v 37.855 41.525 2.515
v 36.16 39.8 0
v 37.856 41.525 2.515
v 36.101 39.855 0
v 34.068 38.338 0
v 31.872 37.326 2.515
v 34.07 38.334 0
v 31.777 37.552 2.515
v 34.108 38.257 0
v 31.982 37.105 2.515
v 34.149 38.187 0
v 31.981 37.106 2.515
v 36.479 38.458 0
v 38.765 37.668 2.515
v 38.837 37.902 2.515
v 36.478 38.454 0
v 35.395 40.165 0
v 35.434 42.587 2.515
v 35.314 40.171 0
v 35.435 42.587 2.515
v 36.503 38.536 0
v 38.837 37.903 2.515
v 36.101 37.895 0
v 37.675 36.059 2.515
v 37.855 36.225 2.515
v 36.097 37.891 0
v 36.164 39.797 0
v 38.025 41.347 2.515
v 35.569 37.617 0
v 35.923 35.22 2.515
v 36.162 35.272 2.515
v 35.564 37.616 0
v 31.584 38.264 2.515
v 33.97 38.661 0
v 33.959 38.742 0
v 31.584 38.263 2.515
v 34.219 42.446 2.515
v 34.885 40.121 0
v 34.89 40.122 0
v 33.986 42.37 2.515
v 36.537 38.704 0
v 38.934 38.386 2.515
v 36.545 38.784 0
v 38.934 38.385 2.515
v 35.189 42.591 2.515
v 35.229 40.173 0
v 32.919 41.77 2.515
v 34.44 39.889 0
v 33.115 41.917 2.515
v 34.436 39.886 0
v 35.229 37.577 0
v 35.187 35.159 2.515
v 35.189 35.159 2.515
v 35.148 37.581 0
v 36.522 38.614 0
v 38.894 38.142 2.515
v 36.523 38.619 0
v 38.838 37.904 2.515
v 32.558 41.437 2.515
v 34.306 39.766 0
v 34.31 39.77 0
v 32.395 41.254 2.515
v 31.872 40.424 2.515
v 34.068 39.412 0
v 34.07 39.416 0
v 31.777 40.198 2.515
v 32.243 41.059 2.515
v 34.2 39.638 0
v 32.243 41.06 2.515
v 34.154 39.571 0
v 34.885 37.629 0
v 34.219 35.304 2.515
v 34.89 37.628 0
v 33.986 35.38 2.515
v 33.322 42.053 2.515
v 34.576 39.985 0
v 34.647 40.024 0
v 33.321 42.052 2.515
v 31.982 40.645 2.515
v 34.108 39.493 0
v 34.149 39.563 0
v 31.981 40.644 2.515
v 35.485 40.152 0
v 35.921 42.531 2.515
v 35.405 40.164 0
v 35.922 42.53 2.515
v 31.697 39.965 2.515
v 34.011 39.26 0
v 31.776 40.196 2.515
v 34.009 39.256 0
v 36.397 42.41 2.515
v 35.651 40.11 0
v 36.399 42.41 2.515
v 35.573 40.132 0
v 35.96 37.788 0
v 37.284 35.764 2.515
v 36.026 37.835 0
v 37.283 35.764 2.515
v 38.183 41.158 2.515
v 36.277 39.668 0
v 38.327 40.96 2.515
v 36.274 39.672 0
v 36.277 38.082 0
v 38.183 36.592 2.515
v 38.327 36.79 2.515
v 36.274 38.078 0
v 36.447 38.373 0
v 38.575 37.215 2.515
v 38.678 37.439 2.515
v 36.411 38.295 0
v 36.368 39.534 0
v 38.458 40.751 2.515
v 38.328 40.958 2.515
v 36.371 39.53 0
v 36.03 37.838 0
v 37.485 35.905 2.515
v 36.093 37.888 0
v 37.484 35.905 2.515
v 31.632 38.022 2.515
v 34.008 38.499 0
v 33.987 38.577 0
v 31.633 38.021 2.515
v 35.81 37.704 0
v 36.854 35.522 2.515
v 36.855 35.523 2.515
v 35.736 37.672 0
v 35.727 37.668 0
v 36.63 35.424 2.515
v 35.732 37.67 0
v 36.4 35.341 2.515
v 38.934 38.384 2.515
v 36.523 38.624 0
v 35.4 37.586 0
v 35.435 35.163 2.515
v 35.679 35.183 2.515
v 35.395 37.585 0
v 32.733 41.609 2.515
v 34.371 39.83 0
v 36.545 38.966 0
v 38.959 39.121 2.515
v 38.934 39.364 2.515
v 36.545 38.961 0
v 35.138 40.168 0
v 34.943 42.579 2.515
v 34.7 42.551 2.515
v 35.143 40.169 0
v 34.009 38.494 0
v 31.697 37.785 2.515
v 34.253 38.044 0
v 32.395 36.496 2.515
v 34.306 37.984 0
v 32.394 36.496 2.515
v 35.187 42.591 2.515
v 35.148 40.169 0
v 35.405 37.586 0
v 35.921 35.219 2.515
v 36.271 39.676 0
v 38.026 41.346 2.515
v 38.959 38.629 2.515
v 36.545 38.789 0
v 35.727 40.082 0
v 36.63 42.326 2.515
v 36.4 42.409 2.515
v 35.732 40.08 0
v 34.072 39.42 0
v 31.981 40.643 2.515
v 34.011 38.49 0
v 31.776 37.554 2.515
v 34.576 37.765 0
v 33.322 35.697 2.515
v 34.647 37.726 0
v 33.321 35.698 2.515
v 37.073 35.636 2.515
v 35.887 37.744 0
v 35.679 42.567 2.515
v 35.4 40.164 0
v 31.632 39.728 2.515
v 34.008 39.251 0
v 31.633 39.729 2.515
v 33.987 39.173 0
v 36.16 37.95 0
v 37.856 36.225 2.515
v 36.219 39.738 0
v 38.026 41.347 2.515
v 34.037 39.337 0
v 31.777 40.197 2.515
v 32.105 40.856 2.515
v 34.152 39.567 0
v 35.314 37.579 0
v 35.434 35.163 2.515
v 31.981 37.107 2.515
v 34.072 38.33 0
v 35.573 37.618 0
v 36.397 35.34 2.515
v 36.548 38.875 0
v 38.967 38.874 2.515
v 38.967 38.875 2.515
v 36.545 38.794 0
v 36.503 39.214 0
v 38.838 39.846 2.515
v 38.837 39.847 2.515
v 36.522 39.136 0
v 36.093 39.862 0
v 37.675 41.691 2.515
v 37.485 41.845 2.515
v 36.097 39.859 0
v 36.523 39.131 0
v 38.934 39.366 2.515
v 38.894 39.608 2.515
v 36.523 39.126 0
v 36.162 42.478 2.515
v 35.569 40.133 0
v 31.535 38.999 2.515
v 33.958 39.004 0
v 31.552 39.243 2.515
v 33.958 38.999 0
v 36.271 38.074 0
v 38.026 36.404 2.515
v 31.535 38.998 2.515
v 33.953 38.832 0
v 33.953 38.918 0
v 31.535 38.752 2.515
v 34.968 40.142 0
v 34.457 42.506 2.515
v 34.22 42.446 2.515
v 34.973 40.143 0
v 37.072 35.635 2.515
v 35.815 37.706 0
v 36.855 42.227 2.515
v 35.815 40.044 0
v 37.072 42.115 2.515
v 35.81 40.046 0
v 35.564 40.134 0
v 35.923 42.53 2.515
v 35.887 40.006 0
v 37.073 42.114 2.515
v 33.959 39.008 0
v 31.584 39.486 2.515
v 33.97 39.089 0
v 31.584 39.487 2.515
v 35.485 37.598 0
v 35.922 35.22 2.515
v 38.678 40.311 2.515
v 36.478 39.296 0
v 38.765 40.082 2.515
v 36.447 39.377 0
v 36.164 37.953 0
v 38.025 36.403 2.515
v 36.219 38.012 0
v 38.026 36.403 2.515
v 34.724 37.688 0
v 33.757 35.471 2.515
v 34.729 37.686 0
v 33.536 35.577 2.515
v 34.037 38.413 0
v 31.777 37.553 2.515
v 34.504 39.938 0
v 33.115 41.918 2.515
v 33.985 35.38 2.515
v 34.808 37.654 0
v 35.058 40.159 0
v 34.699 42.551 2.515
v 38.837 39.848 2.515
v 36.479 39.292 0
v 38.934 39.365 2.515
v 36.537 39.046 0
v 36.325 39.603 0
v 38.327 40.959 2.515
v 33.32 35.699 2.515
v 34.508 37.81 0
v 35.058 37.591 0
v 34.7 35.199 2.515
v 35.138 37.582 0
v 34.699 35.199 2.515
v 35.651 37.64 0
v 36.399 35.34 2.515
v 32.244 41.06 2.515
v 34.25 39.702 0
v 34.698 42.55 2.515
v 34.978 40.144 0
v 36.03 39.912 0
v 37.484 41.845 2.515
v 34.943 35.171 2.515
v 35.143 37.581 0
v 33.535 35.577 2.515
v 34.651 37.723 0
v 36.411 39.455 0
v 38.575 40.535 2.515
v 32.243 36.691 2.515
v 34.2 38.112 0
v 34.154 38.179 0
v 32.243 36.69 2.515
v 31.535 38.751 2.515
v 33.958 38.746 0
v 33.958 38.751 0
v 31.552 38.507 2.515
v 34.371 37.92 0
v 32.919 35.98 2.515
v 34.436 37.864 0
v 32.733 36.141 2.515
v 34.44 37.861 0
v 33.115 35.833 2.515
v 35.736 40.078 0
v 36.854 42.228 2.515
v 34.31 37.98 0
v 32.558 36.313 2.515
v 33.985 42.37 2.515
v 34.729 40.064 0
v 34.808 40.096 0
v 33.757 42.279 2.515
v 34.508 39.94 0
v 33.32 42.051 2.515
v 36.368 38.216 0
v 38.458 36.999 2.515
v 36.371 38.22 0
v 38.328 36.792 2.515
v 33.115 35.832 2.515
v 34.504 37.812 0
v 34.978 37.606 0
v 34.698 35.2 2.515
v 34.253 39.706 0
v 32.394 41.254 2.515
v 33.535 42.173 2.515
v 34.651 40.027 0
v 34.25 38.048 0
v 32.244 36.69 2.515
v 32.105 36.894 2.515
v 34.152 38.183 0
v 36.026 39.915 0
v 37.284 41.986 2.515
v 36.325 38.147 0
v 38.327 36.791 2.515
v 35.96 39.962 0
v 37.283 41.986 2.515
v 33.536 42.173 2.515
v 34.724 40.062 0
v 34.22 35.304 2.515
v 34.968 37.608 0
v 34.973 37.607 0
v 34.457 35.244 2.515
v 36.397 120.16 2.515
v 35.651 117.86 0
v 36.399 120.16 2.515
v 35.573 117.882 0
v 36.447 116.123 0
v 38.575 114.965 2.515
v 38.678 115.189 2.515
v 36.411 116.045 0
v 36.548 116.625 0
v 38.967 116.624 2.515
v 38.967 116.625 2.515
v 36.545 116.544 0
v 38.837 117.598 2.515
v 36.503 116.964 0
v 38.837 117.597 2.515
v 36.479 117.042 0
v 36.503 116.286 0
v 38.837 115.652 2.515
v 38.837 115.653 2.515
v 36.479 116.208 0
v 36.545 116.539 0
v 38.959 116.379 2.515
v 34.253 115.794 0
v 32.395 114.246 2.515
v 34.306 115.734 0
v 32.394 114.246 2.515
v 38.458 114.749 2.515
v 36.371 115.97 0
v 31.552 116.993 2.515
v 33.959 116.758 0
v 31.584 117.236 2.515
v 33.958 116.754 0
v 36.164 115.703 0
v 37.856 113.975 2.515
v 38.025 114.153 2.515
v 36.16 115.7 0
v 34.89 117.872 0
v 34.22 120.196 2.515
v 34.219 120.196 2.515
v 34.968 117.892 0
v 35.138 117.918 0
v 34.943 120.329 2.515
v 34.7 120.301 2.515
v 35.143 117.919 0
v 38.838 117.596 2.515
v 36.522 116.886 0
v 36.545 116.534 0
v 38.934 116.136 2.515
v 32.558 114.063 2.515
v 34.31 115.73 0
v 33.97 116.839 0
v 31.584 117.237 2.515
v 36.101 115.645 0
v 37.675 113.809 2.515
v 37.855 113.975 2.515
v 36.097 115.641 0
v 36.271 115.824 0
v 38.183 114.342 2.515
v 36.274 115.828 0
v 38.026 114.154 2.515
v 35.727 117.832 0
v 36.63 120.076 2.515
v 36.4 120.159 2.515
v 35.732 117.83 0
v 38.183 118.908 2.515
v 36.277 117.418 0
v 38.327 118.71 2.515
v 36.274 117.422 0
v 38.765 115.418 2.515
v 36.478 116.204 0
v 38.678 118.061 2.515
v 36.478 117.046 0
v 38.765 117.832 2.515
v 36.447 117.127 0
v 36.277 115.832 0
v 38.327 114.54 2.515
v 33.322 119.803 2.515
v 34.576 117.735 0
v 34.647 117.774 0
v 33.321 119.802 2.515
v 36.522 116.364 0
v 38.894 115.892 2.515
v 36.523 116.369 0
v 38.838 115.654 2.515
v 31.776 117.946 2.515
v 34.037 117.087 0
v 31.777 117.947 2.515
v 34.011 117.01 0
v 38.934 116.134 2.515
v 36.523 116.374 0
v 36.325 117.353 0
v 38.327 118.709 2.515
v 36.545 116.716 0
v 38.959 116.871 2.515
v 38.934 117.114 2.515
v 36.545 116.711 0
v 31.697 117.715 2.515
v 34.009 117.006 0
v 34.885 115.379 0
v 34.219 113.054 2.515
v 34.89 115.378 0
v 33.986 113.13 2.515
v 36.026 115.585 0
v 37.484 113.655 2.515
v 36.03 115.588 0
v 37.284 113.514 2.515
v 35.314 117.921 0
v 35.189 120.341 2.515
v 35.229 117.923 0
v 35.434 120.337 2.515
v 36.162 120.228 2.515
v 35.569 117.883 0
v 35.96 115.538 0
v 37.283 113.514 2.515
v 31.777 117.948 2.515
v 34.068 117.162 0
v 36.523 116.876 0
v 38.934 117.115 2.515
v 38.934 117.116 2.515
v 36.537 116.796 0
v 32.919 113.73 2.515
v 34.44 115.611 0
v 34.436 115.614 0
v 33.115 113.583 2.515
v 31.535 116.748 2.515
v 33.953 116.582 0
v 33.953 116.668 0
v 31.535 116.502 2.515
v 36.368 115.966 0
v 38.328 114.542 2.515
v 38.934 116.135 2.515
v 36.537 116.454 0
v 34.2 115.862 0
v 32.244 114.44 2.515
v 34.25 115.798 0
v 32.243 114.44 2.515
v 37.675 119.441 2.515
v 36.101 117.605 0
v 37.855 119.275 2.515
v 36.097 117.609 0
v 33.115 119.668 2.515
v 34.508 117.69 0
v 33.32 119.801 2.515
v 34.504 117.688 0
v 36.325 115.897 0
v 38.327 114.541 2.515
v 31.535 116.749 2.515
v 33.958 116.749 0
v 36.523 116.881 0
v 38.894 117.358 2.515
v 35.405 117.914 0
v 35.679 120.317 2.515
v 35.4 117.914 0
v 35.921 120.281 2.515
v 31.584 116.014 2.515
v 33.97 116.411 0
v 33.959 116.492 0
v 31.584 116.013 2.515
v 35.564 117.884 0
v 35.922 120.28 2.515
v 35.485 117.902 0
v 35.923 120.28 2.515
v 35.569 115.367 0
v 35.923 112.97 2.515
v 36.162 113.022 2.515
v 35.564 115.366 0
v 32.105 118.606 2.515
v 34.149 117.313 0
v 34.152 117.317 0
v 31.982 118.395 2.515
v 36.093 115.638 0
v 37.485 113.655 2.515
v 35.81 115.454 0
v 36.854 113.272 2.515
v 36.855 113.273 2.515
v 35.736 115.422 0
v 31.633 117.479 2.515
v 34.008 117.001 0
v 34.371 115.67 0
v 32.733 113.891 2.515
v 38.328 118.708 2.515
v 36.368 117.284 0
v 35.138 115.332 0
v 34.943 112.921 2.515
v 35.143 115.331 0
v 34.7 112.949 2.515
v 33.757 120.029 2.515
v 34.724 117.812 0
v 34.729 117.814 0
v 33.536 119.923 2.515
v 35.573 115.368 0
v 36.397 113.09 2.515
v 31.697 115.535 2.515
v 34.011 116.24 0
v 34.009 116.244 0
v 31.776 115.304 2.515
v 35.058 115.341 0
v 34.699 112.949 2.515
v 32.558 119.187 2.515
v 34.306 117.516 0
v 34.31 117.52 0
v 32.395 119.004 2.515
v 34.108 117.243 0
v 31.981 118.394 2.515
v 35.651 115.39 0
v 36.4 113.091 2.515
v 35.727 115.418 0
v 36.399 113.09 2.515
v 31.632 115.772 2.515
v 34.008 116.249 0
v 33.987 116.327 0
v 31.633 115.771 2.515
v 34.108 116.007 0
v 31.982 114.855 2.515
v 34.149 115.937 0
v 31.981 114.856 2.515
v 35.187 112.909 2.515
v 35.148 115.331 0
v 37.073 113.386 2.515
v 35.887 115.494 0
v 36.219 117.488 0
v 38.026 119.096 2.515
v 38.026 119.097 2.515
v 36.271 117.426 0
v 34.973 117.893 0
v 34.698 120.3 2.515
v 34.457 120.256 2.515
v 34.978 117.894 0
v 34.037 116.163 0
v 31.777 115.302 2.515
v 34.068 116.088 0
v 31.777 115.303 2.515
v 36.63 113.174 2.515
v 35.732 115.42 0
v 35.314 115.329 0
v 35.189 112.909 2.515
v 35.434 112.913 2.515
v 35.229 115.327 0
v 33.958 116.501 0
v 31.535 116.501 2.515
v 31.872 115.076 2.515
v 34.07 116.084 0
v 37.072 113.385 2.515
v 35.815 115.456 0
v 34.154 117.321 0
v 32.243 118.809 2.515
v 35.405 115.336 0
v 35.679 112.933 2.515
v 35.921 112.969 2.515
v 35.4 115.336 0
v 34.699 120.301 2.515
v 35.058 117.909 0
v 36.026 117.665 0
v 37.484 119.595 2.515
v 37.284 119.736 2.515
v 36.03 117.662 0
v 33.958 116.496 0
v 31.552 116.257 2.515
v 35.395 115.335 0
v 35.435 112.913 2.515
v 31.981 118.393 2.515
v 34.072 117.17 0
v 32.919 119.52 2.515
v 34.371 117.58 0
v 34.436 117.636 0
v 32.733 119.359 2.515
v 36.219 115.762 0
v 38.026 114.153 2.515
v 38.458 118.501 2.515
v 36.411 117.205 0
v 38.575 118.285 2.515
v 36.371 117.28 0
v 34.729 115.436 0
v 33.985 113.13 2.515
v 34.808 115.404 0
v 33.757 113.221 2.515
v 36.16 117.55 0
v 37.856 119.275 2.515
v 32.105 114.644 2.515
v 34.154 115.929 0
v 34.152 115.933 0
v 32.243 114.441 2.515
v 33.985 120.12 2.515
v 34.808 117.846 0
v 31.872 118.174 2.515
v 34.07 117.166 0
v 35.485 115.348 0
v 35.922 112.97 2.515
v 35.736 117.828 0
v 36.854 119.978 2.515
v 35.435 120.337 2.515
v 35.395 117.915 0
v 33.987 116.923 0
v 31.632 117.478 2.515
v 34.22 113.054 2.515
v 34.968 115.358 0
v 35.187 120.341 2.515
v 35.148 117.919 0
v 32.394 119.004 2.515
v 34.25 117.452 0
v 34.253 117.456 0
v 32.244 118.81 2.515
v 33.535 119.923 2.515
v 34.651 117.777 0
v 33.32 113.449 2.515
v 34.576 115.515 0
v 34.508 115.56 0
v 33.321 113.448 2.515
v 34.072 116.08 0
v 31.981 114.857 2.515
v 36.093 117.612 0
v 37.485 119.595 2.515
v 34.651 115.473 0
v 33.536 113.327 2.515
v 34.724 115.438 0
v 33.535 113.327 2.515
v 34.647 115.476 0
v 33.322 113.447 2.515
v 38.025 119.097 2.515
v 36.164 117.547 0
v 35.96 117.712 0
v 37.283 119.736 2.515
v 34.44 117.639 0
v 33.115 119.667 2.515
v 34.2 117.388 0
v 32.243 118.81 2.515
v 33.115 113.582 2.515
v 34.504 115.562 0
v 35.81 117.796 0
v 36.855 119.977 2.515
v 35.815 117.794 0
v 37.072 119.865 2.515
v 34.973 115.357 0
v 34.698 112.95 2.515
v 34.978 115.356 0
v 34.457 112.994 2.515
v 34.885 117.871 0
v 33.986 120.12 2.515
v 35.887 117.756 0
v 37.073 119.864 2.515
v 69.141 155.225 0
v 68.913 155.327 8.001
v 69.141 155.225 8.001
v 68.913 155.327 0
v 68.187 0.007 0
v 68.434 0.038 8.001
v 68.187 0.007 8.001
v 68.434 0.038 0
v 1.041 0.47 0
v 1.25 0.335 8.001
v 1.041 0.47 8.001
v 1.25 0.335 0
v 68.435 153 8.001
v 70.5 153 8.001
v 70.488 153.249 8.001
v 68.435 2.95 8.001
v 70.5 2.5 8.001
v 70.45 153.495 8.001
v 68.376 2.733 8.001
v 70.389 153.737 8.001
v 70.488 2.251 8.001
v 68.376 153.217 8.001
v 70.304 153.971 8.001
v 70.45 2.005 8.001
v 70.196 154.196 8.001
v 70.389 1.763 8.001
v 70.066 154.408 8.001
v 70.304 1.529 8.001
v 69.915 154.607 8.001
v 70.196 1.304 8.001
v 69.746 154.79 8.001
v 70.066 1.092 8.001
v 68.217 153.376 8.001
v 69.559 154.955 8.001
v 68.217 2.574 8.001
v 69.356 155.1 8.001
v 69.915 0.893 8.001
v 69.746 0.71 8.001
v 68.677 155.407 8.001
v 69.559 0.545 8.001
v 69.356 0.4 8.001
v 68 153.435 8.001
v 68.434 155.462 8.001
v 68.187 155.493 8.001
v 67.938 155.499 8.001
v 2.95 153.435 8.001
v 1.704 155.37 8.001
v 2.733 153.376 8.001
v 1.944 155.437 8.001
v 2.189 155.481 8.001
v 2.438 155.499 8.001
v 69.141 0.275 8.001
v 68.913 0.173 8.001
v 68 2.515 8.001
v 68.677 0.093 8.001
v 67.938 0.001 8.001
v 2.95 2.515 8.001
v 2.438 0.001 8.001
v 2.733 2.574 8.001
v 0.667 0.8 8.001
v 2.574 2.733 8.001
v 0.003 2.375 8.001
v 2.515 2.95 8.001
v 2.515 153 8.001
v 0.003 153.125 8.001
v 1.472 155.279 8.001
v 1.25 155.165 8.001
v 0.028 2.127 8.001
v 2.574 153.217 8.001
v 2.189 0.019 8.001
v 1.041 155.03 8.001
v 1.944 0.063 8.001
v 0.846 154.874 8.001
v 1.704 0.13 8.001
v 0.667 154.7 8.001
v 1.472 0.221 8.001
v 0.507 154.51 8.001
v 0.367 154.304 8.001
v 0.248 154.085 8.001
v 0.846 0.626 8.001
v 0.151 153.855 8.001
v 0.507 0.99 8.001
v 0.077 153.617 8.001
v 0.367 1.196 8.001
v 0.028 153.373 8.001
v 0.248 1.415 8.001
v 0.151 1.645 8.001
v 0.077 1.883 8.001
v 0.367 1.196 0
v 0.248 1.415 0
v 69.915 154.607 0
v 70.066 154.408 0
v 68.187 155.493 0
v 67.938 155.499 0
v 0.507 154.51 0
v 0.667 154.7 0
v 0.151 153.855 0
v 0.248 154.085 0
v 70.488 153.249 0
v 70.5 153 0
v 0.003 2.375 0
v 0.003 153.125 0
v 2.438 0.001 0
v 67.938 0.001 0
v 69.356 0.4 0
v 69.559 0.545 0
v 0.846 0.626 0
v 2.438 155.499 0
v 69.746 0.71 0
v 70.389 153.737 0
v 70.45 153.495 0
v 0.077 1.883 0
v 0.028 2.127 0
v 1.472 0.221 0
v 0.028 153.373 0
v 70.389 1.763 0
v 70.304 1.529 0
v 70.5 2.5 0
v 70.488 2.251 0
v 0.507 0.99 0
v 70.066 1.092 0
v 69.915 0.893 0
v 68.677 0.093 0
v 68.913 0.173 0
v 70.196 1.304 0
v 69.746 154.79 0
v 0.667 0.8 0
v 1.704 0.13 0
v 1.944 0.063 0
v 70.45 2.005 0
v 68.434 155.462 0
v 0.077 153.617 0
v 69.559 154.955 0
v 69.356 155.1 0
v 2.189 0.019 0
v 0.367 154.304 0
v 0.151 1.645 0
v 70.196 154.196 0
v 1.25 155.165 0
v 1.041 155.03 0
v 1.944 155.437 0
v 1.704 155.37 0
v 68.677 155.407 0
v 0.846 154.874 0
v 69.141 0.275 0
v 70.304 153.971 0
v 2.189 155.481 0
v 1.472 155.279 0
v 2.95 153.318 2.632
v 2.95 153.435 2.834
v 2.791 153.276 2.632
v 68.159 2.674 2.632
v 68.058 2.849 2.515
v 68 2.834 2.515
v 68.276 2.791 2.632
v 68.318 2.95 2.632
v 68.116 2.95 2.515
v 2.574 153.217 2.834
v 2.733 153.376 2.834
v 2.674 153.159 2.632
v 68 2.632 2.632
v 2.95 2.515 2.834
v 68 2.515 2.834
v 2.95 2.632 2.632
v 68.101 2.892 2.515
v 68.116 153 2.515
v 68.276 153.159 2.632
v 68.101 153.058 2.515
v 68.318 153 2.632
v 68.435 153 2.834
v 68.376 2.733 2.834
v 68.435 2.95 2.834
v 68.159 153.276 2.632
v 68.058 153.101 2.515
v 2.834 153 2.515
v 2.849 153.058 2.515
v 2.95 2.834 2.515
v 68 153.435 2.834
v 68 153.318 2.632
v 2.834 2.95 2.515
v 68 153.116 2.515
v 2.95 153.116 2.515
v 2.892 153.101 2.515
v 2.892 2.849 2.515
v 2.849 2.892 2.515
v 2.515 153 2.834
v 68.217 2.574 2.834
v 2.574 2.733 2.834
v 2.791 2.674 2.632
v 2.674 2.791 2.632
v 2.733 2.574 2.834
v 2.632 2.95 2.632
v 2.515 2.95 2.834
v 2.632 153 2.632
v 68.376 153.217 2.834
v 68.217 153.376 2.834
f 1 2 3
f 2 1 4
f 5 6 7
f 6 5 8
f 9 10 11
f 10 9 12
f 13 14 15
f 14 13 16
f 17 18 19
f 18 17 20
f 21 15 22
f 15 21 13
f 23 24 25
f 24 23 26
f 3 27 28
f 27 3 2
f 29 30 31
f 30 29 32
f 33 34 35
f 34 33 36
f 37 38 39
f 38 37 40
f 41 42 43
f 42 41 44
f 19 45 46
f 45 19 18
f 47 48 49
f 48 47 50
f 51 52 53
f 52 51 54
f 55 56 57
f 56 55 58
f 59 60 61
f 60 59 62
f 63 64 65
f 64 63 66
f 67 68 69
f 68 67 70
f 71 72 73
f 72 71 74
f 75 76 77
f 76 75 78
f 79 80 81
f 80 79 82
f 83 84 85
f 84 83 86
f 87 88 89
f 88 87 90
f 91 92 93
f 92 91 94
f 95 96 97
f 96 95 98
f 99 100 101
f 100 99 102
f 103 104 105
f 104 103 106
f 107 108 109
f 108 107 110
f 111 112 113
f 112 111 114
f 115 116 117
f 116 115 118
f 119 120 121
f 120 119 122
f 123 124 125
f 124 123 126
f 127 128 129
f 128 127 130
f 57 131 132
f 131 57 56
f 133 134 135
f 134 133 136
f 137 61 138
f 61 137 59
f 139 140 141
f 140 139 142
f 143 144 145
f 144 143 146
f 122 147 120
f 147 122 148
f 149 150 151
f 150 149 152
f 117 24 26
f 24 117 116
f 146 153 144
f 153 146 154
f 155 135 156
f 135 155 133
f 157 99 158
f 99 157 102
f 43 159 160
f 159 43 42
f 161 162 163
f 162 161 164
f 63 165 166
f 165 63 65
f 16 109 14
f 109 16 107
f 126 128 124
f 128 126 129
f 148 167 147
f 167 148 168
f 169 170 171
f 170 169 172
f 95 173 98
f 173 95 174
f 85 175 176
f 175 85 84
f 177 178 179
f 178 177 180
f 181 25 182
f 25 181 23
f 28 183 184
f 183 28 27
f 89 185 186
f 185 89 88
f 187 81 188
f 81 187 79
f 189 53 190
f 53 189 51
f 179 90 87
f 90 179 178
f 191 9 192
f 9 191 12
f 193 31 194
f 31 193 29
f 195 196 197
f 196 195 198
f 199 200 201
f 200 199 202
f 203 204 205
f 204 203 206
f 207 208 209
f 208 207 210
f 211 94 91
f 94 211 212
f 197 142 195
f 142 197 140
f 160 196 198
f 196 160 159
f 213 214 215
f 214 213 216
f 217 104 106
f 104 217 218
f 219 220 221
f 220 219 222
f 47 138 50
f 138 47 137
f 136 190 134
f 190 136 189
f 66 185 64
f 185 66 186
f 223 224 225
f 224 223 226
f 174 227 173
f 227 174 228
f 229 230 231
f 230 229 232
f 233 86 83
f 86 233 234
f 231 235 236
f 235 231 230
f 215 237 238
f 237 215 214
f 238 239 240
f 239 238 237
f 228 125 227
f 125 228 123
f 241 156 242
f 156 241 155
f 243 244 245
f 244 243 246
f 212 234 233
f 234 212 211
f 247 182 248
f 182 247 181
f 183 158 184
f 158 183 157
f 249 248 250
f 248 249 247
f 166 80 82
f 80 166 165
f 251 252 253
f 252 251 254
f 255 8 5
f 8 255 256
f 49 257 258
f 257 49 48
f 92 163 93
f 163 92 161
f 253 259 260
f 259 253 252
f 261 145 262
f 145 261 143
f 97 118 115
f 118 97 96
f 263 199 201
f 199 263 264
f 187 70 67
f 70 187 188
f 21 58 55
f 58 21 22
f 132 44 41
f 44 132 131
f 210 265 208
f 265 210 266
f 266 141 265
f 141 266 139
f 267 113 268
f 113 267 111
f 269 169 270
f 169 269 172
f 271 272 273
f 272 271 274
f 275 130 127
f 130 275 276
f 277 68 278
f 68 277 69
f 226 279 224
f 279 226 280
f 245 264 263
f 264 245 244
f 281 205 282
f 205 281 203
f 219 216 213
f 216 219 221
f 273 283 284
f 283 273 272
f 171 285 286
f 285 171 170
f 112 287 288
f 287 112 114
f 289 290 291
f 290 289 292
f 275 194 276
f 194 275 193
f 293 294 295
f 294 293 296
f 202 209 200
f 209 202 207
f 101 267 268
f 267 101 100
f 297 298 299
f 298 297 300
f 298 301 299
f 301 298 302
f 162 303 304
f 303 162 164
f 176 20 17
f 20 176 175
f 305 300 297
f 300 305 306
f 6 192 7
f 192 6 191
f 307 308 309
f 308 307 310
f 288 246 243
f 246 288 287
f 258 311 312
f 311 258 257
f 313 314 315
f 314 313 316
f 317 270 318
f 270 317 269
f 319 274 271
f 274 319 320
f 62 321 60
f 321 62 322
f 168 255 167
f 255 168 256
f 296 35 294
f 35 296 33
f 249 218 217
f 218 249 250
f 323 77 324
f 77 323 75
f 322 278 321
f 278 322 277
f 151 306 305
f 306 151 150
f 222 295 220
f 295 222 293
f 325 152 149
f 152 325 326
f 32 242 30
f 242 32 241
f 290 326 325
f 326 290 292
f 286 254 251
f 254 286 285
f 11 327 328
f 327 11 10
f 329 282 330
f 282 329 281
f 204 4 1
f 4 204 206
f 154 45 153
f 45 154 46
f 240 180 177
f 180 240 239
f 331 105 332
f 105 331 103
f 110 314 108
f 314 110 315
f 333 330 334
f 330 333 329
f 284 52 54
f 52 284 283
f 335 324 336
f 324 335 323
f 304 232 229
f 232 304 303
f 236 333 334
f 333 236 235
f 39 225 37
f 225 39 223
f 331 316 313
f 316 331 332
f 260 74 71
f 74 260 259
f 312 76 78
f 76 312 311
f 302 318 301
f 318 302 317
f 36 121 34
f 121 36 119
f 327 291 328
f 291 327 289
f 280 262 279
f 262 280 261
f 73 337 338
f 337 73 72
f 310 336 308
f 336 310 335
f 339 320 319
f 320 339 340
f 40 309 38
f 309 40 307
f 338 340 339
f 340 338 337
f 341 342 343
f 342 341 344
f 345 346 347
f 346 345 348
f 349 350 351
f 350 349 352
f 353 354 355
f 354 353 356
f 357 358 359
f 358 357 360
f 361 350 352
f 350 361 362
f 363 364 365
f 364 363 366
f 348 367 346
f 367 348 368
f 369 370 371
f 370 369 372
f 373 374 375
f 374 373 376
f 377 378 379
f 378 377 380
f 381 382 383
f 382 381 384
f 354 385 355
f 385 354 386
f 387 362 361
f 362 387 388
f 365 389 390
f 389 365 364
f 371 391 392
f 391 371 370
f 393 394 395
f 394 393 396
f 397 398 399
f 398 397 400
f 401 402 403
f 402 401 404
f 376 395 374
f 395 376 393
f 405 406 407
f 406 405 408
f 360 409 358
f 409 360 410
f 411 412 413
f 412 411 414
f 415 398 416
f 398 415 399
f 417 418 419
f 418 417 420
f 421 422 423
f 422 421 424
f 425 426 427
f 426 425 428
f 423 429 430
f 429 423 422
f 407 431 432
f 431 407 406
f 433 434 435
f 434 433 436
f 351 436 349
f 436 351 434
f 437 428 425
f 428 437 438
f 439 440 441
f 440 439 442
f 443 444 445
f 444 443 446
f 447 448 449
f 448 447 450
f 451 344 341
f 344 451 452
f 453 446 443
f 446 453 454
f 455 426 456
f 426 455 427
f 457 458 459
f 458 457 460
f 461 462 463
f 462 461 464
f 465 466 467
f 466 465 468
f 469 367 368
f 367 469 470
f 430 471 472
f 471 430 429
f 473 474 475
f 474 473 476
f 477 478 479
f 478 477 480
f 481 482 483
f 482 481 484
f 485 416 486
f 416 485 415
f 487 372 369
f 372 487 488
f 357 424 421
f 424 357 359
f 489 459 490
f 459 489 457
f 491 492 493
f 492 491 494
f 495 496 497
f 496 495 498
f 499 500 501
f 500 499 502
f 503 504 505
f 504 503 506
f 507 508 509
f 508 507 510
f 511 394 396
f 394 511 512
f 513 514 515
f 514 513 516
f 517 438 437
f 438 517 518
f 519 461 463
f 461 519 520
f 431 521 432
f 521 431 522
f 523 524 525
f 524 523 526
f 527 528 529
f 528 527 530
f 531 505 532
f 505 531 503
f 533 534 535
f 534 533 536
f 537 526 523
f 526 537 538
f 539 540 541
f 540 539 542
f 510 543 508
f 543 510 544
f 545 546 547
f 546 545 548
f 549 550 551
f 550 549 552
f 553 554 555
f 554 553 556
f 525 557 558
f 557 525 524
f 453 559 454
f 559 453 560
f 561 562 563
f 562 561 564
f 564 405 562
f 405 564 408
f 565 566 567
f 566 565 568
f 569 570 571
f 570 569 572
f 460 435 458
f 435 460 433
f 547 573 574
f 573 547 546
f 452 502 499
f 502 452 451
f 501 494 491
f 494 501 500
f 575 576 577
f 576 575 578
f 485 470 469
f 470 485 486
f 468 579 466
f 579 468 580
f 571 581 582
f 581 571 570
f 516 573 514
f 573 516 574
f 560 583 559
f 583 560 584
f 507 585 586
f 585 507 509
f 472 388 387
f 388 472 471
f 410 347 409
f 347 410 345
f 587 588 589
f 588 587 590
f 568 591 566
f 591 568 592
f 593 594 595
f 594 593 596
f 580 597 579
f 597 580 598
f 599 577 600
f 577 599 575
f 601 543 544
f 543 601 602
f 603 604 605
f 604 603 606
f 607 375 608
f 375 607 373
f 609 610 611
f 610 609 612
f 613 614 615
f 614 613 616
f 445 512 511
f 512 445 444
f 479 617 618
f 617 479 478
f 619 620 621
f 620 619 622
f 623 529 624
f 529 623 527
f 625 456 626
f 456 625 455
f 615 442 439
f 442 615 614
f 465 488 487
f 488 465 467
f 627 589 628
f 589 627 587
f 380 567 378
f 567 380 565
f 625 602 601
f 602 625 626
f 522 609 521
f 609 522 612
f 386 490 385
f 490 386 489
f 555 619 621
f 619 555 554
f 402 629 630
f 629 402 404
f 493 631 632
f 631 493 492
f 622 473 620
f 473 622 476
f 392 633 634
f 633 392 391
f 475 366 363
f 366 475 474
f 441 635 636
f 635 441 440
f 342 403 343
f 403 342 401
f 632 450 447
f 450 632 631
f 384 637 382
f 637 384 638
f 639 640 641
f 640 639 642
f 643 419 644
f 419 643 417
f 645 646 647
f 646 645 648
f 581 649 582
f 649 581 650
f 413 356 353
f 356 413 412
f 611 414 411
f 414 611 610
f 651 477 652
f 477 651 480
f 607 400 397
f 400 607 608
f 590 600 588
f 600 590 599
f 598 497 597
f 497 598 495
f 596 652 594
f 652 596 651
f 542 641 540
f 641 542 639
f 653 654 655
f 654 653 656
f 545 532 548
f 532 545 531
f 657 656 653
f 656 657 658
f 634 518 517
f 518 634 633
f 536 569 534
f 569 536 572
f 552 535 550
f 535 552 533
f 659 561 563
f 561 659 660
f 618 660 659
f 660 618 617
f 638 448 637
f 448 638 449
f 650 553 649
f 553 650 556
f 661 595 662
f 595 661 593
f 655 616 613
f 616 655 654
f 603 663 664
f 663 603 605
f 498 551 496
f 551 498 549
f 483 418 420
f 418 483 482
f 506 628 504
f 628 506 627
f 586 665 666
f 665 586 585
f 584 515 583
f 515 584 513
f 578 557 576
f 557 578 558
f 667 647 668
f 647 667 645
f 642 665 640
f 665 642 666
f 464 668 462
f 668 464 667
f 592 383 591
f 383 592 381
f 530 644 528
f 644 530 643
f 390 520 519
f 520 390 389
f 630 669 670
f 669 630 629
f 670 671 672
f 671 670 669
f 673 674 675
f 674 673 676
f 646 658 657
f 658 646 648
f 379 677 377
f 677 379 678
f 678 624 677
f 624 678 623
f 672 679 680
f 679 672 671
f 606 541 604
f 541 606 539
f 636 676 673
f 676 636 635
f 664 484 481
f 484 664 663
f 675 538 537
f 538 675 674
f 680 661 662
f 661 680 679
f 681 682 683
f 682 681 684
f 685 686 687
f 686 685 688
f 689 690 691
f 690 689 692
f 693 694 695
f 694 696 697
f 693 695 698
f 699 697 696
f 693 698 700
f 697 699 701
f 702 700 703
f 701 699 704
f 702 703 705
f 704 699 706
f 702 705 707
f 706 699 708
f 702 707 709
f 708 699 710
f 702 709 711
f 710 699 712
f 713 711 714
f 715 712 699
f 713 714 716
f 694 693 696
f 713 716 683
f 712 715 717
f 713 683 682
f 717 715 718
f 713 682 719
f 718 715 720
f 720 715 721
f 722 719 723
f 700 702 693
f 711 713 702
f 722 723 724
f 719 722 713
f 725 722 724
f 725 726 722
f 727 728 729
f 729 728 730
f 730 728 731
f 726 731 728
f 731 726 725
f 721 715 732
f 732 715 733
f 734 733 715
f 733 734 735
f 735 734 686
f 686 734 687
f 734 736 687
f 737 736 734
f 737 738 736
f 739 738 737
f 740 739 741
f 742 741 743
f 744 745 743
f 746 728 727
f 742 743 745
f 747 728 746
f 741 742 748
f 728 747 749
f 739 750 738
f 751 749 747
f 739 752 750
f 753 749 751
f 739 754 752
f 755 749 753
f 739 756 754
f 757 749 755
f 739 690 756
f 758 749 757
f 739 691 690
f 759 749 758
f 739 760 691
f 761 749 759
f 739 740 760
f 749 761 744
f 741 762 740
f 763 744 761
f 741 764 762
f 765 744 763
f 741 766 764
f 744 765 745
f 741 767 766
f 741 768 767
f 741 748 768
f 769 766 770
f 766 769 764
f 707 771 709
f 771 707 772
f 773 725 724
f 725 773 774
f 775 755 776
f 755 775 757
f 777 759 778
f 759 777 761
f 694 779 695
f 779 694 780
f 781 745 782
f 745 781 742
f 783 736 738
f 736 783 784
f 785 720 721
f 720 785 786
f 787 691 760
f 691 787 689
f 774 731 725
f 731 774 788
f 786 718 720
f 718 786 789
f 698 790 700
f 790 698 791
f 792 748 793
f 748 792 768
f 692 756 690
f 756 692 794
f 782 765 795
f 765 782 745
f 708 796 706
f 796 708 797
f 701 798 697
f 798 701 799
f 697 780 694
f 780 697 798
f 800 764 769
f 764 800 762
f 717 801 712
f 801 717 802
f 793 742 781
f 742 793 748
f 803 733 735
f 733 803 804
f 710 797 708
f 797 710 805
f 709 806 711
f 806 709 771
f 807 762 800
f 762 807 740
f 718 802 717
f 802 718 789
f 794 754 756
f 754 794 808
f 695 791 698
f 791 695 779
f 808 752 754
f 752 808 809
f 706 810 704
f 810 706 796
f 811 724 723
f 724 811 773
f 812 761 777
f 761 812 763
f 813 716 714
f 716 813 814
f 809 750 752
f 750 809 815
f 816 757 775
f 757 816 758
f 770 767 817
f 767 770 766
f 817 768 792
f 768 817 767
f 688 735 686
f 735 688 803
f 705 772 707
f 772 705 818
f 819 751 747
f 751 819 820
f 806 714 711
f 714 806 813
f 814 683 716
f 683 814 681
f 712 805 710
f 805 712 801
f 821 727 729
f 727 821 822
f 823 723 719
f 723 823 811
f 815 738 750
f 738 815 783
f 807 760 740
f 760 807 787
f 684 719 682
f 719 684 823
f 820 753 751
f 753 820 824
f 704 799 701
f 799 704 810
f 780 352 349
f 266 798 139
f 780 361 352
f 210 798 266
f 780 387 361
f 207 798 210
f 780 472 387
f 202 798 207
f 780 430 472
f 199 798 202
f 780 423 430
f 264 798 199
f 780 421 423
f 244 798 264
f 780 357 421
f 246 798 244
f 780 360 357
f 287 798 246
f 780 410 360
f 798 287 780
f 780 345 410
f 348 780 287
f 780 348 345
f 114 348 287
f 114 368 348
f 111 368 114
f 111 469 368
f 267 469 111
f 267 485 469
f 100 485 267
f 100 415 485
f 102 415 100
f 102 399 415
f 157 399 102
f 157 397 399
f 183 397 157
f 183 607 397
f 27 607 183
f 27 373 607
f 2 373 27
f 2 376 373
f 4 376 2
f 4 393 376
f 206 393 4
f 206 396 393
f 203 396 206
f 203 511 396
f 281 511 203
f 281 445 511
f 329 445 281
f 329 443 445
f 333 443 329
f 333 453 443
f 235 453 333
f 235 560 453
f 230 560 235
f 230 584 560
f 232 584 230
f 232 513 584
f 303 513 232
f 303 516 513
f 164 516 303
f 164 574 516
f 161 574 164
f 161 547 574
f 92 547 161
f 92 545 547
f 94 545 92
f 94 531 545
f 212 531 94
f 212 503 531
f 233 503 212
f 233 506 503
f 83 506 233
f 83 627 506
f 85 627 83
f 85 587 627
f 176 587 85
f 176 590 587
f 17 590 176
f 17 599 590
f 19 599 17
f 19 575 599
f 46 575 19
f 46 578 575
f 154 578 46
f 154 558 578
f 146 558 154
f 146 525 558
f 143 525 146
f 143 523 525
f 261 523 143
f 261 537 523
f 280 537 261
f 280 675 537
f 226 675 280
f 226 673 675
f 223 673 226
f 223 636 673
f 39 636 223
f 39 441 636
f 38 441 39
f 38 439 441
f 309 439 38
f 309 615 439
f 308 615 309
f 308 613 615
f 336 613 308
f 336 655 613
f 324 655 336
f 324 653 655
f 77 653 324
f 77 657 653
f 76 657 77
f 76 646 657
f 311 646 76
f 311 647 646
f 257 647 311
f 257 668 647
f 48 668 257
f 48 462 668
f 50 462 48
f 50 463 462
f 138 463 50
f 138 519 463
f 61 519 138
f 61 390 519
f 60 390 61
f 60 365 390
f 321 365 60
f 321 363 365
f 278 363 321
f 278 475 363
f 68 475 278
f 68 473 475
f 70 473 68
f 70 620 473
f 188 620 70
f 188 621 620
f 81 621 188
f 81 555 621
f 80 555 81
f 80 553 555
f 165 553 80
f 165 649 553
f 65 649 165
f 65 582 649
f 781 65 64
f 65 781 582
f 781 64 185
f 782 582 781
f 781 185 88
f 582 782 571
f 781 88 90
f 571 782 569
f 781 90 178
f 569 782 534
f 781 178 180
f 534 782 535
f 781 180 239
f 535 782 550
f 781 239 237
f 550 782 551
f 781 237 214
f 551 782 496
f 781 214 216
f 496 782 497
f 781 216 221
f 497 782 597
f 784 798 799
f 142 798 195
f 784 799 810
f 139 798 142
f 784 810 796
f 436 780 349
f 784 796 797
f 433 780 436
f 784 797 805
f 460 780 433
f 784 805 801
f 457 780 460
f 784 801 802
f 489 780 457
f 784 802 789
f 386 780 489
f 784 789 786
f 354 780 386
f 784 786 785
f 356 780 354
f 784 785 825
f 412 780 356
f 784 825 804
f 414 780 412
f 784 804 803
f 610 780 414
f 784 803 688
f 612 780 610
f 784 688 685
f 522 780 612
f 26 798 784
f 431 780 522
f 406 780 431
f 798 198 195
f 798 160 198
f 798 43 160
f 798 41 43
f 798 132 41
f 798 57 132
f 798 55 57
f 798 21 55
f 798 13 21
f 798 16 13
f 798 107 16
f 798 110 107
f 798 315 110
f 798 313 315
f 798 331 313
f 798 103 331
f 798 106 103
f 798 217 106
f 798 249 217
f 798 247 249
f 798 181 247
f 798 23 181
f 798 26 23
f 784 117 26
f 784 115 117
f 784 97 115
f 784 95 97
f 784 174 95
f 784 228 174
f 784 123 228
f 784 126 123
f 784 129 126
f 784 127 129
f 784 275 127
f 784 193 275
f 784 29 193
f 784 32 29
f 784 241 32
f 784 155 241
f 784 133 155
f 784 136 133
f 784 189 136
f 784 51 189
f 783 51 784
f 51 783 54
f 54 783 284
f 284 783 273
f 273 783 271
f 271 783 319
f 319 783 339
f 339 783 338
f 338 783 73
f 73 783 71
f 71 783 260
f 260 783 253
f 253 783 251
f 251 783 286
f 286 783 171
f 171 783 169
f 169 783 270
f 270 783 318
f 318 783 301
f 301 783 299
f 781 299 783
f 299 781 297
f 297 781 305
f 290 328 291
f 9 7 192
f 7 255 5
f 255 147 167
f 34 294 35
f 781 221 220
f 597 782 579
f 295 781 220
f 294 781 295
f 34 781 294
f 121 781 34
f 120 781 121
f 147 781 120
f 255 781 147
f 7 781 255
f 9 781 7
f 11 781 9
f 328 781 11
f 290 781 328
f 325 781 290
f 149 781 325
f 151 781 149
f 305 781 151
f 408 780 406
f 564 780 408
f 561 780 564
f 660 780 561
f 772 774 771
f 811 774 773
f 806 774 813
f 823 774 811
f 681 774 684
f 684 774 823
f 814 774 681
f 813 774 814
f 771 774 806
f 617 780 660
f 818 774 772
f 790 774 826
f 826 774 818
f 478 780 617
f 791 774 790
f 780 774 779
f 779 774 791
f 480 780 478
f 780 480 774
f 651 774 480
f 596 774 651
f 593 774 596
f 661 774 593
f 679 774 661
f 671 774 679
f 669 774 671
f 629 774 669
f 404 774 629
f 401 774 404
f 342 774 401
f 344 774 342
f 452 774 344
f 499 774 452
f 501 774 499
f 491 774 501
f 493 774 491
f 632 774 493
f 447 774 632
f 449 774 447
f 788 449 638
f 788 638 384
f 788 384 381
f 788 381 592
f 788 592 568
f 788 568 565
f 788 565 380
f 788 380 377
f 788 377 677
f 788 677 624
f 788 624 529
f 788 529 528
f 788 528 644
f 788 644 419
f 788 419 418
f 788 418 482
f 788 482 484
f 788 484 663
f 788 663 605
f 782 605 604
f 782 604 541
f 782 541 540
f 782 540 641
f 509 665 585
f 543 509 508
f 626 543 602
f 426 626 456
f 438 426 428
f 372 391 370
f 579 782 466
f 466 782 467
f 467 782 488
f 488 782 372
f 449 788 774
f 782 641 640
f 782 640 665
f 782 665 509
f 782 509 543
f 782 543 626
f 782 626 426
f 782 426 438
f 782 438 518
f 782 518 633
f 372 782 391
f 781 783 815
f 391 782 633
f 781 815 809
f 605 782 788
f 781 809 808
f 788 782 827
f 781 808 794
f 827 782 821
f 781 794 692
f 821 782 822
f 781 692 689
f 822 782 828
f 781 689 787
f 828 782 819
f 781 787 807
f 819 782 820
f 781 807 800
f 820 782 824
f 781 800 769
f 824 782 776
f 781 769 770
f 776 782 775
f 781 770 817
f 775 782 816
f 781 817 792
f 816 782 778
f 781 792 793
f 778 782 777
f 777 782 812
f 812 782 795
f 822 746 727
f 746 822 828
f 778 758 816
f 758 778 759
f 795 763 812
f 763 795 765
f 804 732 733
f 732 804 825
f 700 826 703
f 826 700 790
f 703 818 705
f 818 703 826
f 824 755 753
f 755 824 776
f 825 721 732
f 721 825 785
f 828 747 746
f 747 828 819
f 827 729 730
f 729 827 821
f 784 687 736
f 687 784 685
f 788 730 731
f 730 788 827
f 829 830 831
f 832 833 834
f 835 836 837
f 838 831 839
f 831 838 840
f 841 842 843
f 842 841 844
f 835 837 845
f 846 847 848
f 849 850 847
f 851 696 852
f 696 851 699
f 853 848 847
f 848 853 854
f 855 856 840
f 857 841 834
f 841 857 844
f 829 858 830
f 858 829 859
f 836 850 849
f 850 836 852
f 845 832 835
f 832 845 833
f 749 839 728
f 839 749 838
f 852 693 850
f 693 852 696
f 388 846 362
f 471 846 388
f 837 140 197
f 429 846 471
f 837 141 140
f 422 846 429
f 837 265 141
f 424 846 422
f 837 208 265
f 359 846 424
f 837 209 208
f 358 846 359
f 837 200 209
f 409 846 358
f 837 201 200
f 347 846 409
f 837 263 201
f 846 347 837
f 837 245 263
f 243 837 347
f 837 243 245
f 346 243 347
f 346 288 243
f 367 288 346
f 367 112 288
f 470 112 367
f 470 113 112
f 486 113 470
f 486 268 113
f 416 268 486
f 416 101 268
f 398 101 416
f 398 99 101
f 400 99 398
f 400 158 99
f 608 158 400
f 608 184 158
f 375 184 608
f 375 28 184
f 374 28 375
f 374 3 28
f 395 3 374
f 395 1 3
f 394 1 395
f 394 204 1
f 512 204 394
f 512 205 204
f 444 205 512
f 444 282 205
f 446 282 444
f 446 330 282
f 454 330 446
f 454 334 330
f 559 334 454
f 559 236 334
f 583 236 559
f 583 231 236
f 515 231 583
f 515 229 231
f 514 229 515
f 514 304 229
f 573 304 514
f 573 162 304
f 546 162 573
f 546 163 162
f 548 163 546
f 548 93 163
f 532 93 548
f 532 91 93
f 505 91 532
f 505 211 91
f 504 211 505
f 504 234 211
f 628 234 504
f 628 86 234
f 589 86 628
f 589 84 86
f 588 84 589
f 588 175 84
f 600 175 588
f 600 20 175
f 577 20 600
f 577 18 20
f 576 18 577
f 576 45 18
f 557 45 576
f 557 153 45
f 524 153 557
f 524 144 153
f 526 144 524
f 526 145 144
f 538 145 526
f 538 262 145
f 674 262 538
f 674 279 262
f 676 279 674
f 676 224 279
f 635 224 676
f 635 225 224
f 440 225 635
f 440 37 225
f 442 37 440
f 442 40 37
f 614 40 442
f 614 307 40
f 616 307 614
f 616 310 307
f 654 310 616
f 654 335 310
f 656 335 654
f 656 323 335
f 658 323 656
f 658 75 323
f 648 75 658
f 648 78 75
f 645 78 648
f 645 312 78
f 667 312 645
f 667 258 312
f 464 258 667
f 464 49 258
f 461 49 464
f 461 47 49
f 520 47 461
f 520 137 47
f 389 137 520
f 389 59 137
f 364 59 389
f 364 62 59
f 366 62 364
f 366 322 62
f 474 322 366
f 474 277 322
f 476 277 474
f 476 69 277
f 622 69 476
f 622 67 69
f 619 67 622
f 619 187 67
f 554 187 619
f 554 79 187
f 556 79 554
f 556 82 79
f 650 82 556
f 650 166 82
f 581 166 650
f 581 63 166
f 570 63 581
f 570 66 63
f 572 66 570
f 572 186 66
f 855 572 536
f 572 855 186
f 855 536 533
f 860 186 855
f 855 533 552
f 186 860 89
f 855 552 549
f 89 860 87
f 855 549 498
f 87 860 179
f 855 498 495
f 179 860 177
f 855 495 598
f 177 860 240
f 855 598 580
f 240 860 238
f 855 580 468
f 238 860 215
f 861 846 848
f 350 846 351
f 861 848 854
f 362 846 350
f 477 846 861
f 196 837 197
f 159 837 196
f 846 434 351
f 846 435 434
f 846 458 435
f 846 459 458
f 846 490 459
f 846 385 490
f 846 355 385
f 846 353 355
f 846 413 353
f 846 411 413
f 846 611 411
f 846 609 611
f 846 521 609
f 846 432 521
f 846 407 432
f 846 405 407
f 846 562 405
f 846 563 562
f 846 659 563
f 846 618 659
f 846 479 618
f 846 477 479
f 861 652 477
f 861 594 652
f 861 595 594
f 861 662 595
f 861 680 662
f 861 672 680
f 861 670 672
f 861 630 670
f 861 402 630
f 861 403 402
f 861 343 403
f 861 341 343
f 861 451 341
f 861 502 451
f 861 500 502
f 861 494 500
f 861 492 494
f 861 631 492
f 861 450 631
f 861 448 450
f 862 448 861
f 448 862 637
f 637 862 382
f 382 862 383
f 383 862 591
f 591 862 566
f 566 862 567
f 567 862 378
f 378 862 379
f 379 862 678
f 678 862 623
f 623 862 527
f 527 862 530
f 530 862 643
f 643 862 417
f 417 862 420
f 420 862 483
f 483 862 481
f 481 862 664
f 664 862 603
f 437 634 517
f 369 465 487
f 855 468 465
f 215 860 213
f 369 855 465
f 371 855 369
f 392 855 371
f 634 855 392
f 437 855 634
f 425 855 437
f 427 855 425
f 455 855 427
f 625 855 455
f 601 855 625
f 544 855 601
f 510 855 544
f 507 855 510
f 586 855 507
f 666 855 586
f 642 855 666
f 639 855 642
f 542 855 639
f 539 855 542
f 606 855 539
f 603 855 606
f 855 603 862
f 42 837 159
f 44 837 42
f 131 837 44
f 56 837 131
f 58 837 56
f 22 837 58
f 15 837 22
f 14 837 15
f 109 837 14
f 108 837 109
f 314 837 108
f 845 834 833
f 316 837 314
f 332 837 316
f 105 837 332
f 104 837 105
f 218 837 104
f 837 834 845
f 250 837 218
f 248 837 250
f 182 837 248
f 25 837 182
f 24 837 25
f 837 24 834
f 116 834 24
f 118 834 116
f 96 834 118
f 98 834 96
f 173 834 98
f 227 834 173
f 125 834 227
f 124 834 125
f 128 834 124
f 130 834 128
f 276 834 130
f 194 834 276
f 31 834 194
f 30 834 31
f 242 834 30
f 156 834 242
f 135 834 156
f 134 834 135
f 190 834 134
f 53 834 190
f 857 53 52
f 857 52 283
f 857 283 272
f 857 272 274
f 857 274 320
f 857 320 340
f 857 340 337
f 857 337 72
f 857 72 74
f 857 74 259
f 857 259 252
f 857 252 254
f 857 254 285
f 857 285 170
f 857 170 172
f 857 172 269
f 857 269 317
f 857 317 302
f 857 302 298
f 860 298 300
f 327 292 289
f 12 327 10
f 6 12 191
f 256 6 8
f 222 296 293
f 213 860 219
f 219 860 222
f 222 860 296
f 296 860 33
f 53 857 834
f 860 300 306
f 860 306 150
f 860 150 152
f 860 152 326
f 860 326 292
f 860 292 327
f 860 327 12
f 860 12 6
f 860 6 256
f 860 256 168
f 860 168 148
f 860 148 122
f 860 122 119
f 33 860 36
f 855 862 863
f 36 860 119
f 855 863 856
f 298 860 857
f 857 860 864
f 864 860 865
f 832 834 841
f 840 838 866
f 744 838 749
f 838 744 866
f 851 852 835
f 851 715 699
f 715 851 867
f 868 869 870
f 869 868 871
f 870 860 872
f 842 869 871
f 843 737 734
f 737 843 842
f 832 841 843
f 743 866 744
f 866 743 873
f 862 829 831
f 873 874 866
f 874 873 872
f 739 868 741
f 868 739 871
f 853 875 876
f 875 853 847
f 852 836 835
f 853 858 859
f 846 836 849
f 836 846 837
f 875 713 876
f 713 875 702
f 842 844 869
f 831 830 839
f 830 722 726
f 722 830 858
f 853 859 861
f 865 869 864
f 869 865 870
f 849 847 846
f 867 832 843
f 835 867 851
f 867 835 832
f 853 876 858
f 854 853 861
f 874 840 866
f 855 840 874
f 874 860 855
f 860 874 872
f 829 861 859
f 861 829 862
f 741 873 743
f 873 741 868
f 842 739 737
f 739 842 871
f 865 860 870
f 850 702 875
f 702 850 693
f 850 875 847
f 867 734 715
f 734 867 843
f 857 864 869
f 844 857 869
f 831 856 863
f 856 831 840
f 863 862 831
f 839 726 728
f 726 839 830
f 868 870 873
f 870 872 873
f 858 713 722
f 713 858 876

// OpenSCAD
/*

Battery Plate Generator V1

This was developed to hold an array of SLA batteries.
It could be used to generate a holding plate for any regular
rectangular-based items. 

Created by Sk0pe (Micha Wotton). (c) 2020

*/


// Parameters

/* [Base Plate] */
Plate_Thickness = 2.5;
Round_corners = true;
Screw_Holes = true;

/* [Battery] */
Battery_Width = 65.5;
Battery_Length = 150.5;
Curved_Edges = true;
Curve_Radius = 0.45;

/* [Dividers] */
Divider_Width = 2.5;
Divider_Height = 5.5;

/* [Quality Settings] */
// Minimum size of a fragment
fs = 0.25; 
// Minimum angle for a fragment
fa = 1; 
// Number of fragments (overrides fs & fa if non zero)
fn = 0; 


// Setup
edgeCurveRadius = Curved_Edges ?  Curve_Radius : 0;

offsetX = Battery_Width+Divider_Width;
offsetY = Battery_Length+Divider_Width;
totalHeight = Plate_Thickness+Divider_Height;

/***************\
|  Main Process |
\***************/




difference()
{
    mainPlate();
    battery(edgeCurveRadius);
    screws();
}    


/********************\
|  Main Plate Module |
\********************/
module mainPlate() 
{
    if (Round_corners) {
        minkowski()
        {
            // Quality parameters
            $fs = fs; 
            $fa = fa;
            $fn = fn;

            translate([Divider_Width, Divider_Width, 0])
            {
                cube([Battery_Width,Battery_Length,totalHeight]);
            }
            cylinder(0.001, r=Divider_Width);
        }
    } else {
        cube([Battery_Width + 2*Divider_Width,Battery_Length + 2*Divider_Width,totalHeight]);
    }
}


/************************\
|  Single Battery Module |
\************************/
module battery(edgeCurveRadius) 
{
    translate([Divider_Width, Divider_Width, Plate_Thickness])
    {
        minkowski(){

            // Quality parameters
            $fs = fs; 
            $fa = fa;
            $fn = fn;

            translate([edgeCurveRadius, edgeCurveRadius, edgeCurveRadius]){
                cube([Battery_Width-edgeCurveRadius, Battery_Length-edgeCurveRadius, totalHeight-edgeCurveRadius]);
            }
            sphere(r=edgeCurveRadius, $fs = fs, $fa = fa, $fn = fn);
        }
    }
}


/****************\
|  Screws Module |
\****************/
module screws() 
{
    translate([(Battery_Width + 2*Divider_Width)/2, (Battery_Length + 2*Divider_Width)/4, -0.05])
    {
        cylinder(r1=Plate_Thickness/2, r2=Plate_Thickness*1.5, h = Plate_Thickness+0.1, center=false, $fs = fs, $fa = fa, $fn = fn);
    }
    translate([(Battery_Width + 2*Divider_Width)/2, (Battery_Length + 2*Divider_Width)*3/4, -0.05])
    {
        cylinder(r1=Plate_Thickness/2, r2=Plate_Thickness*1.5, h = Plate_Thickness+0.1, center=false, $fs = fs, $fa = fa, $fn = fn);
    }
}
